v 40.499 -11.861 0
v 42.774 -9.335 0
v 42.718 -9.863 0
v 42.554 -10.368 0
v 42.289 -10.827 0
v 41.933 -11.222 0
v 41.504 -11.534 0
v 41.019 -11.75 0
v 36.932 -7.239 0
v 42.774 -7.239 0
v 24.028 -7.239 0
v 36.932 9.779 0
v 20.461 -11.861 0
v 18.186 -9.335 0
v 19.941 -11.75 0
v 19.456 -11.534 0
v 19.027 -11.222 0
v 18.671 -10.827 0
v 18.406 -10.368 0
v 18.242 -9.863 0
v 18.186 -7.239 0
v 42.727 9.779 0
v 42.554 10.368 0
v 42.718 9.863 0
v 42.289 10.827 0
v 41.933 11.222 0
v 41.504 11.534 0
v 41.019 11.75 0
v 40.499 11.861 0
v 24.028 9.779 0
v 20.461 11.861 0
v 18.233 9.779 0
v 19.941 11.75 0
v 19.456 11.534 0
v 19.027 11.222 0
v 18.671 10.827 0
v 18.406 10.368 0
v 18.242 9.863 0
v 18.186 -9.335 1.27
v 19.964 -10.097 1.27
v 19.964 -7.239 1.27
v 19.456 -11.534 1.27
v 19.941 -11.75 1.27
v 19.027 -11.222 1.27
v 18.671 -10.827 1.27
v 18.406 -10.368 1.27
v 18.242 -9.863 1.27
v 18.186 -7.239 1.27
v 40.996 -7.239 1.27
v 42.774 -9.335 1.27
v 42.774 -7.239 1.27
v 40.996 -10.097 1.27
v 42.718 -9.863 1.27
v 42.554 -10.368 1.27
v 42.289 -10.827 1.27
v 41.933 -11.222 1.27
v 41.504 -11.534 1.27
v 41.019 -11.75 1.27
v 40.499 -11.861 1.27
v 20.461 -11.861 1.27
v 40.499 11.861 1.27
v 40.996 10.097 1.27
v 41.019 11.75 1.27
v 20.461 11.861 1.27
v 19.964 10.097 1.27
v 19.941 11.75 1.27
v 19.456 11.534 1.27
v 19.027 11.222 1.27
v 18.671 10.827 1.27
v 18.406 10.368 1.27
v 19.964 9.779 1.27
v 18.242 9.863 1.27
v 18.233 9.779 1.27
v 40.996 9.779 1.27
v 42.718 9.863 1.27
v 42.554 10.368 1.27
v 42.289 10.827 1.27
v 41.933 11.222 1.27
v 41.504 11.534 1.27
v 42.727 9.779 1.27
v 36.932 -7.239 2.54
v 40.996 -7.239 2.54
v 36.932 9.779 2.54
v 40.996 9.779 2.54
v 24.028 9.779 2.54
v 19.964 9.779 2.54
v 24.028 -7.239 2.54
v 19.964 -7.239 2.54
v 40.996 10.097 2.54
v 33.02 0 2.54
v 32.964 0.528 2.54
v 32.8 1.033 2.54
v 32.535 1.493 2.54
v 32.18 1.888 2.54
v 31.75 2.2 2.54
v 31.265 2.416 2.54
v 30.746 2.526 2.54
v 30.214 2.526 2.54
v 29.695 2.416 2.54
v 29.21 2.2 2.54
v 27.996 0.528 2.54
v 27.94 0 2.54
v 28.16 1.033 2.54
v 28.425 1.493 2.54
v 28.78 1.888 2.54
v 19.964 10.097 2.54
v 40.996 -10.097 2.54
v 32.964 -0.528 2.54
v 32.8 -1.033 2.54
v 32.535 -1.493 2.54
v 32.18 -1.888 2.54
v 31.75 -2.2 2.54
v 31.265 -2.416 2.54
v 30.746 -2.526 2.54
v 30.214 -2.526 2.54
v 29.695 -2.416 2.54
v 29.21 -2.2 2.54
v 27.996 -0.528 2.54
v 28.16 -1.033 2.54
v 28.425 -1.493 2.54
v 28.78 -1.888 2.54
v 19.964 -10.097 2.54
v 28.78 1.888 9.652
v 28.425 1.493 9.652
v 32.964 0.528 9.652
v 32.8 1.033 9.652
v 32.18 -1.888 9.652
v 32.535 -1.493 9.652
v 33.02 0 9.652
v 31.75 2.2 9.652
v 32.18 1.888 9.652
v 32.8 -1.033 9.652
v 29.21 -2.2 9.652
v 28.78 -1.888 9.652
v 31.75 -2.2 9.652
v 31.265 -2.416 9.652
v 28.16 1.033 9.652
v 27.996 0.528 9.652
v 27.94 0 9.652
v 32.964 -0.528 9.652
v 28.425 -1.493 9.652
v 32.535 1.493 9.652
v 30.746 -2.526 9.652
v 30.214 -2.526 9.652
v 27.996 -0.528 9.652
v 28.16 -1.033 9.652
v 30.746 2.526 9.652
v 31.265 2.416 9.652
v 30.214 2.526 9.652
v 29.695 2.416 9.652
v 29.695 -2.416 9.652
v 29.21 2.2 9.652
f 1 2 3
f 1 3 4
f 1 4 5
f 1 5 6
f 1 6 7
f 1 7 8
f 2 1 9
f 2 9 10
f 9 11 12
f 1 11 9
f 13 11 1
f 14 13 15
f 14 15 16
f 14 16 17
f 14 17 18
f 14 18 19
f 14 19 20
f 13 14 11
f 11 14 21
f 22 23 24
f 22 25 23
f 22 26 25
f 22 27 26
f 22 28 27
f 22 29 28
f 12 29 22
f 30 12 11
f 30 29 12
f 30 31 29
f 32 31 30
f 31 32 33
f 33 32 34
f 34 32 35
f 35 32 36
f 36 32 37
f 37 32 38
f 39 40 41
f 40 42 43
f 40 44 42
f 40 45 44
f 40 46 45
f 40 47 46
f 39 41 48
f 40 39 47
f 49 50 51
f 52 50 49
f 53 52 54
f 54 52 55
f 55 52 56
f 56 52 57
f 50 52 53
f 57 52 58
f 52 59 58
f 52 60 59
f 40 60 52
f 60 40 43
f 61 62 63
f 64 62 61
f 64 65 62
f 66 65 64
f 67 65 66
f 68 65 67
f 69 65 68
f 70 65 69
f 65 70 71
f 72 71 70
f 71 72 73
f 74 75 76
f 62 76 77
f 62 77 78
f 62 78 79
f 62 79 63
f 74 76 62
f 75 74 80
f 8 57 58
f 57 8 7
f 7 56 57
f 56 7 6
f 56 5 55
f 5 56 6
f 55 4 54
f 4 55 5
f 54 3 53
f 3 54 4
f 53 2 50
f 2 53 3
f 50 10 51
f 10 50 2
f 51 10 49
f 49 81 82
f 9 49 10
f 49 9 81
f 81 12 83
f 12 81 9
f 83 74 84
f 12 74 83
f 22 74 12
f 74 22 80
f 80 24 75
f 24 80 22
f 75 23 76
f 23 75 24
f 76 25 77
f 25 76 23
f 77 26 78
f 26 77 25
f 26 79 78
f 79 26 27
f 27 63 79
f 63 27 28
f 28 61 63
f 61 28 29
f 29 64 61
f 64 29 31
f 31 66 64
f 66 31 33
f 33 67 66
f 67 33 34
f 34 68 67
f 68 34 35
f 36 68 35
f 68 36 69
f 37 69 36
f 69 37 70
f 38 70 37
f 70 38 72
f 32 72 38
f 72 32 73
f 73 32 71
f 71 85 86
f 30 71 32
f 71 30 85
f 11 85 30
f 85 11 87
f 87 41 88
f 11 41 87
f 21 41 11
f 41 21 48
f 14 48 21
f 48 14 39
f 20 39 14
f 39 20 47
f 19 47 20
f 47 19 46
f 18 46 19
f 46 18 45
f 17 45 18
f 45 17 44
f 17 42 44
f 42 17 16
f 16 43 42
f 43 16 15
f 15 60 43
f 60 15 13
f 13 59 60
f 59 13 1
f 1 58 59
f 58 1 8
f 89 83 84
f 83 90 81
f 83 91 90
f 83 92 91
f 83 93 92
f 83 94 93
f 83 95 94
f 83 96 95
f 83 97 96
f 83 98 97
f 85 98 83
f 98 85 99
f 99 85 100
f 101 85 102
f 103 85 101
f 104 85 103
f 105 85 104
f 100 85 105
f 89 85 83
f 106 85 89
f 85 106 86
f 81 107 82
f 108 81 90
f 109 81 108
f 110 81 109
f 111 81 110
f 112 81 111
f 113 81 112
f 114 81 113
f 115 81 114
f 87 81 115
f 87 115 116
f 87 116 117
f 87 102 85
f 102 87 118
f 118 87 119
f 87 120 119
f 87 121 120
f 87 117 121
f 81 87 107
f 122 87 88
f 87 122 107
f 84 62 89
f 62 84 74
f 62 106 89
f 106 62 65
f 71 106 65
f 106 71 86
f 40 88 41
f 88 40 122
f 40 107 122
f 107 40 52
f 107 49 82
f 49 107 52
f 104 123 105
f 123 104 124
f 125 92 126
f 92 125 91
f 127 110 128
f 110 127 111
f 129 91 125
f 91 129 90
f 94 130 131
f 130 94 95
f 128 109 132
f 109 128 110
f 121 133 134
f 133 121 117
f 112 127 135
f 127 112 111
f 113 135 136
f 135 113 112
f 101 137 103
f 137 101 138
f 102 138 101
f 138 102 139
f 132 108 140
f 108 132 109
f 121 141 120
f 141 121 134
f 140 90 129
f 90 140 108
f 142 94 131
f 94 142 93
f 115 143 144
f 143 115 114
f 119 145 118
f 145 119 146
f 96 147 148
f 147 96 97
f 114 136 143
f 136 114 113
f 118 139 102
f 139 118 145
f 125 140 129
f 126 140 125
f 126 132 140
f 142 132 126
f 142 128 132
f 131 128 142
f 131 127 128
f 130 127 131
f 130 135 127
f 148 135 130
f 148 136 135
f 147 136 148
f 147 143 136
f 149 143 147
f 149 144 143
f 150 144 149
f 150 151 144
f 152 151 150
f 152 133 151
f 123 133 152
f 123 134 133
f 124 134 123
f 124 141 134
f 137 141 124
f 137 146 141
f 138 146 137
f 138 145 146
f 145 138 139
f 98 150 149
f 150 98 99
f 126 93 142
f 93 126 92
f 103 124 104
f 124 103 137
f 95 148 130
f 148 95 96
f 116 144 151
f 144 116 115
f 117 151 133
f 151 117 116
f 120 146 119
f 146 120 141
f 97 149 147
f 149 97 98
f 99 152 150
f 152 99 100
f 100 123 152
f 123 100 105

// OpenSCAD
ViewScale = [0.0254, 0.0254, 0.0254];

module rectHull(r, x, y)
{
    hull()
    {
        translate([(-x/2)+r, (-y/2)+r, 0]) circle(r=r);
        translate([(x/2)-r, (-y/2)+r, 0]) circle(r=r);
        translate([(-x/2)+r, (y/2)-r, 0]) circle(r=r);
        translate([(x/2)-r, (y/2)-r, 0]) circle(r=r);
    }
}
module pirLid()
{
    linear_extrude(50) 
    difference() {
    rectHull(100, 1183, 1510);
    translate([(1183-270)/2, 0, 0])
    square([280, 340], center=true);
    }
    translate([0, 0, 50])
    linear_extrude(260) 
    difference() {
    square([963, 1290], center=true);
    translate([(1183-270)/2, 0, 0])
    square([280, 340], center=true);
    square([863, 1190], center=true);

    }
//    difference() {
//       rectHull(100, 1183, 1510);
//       square([983, 1310], center=true);
//    }
}

module apdsLid()
{
    linear_extrude(50)
    difference(){
    rectHull(100, 968, 935);
    translate([-(968-230)/2, 50, 0])
    square([230, 670], center=true);
    translate([(968-230)/2, 50, 0])
    square([230, 670], center=true);
    }
    translate([0, 0, 50])
    linear_extrude(50)
    difference() {
    square([828, 795], center=true);
    translate([-(968-230)/2, 50, 0])
    square([230, 670], center=true);
    translate([(968-230)/2, 50, 0])
    square([230, 670], center=true);
    }
    translate([0, 0, 100])
    //linear_extrude(328)
    linear_extrude(280)
    circle(100, center=true);
    //square(300, center=true);
}


scale(ViewScale)
{
    translate([1200, 0, 0])
    apdsLid();
//    pirLid();
}
